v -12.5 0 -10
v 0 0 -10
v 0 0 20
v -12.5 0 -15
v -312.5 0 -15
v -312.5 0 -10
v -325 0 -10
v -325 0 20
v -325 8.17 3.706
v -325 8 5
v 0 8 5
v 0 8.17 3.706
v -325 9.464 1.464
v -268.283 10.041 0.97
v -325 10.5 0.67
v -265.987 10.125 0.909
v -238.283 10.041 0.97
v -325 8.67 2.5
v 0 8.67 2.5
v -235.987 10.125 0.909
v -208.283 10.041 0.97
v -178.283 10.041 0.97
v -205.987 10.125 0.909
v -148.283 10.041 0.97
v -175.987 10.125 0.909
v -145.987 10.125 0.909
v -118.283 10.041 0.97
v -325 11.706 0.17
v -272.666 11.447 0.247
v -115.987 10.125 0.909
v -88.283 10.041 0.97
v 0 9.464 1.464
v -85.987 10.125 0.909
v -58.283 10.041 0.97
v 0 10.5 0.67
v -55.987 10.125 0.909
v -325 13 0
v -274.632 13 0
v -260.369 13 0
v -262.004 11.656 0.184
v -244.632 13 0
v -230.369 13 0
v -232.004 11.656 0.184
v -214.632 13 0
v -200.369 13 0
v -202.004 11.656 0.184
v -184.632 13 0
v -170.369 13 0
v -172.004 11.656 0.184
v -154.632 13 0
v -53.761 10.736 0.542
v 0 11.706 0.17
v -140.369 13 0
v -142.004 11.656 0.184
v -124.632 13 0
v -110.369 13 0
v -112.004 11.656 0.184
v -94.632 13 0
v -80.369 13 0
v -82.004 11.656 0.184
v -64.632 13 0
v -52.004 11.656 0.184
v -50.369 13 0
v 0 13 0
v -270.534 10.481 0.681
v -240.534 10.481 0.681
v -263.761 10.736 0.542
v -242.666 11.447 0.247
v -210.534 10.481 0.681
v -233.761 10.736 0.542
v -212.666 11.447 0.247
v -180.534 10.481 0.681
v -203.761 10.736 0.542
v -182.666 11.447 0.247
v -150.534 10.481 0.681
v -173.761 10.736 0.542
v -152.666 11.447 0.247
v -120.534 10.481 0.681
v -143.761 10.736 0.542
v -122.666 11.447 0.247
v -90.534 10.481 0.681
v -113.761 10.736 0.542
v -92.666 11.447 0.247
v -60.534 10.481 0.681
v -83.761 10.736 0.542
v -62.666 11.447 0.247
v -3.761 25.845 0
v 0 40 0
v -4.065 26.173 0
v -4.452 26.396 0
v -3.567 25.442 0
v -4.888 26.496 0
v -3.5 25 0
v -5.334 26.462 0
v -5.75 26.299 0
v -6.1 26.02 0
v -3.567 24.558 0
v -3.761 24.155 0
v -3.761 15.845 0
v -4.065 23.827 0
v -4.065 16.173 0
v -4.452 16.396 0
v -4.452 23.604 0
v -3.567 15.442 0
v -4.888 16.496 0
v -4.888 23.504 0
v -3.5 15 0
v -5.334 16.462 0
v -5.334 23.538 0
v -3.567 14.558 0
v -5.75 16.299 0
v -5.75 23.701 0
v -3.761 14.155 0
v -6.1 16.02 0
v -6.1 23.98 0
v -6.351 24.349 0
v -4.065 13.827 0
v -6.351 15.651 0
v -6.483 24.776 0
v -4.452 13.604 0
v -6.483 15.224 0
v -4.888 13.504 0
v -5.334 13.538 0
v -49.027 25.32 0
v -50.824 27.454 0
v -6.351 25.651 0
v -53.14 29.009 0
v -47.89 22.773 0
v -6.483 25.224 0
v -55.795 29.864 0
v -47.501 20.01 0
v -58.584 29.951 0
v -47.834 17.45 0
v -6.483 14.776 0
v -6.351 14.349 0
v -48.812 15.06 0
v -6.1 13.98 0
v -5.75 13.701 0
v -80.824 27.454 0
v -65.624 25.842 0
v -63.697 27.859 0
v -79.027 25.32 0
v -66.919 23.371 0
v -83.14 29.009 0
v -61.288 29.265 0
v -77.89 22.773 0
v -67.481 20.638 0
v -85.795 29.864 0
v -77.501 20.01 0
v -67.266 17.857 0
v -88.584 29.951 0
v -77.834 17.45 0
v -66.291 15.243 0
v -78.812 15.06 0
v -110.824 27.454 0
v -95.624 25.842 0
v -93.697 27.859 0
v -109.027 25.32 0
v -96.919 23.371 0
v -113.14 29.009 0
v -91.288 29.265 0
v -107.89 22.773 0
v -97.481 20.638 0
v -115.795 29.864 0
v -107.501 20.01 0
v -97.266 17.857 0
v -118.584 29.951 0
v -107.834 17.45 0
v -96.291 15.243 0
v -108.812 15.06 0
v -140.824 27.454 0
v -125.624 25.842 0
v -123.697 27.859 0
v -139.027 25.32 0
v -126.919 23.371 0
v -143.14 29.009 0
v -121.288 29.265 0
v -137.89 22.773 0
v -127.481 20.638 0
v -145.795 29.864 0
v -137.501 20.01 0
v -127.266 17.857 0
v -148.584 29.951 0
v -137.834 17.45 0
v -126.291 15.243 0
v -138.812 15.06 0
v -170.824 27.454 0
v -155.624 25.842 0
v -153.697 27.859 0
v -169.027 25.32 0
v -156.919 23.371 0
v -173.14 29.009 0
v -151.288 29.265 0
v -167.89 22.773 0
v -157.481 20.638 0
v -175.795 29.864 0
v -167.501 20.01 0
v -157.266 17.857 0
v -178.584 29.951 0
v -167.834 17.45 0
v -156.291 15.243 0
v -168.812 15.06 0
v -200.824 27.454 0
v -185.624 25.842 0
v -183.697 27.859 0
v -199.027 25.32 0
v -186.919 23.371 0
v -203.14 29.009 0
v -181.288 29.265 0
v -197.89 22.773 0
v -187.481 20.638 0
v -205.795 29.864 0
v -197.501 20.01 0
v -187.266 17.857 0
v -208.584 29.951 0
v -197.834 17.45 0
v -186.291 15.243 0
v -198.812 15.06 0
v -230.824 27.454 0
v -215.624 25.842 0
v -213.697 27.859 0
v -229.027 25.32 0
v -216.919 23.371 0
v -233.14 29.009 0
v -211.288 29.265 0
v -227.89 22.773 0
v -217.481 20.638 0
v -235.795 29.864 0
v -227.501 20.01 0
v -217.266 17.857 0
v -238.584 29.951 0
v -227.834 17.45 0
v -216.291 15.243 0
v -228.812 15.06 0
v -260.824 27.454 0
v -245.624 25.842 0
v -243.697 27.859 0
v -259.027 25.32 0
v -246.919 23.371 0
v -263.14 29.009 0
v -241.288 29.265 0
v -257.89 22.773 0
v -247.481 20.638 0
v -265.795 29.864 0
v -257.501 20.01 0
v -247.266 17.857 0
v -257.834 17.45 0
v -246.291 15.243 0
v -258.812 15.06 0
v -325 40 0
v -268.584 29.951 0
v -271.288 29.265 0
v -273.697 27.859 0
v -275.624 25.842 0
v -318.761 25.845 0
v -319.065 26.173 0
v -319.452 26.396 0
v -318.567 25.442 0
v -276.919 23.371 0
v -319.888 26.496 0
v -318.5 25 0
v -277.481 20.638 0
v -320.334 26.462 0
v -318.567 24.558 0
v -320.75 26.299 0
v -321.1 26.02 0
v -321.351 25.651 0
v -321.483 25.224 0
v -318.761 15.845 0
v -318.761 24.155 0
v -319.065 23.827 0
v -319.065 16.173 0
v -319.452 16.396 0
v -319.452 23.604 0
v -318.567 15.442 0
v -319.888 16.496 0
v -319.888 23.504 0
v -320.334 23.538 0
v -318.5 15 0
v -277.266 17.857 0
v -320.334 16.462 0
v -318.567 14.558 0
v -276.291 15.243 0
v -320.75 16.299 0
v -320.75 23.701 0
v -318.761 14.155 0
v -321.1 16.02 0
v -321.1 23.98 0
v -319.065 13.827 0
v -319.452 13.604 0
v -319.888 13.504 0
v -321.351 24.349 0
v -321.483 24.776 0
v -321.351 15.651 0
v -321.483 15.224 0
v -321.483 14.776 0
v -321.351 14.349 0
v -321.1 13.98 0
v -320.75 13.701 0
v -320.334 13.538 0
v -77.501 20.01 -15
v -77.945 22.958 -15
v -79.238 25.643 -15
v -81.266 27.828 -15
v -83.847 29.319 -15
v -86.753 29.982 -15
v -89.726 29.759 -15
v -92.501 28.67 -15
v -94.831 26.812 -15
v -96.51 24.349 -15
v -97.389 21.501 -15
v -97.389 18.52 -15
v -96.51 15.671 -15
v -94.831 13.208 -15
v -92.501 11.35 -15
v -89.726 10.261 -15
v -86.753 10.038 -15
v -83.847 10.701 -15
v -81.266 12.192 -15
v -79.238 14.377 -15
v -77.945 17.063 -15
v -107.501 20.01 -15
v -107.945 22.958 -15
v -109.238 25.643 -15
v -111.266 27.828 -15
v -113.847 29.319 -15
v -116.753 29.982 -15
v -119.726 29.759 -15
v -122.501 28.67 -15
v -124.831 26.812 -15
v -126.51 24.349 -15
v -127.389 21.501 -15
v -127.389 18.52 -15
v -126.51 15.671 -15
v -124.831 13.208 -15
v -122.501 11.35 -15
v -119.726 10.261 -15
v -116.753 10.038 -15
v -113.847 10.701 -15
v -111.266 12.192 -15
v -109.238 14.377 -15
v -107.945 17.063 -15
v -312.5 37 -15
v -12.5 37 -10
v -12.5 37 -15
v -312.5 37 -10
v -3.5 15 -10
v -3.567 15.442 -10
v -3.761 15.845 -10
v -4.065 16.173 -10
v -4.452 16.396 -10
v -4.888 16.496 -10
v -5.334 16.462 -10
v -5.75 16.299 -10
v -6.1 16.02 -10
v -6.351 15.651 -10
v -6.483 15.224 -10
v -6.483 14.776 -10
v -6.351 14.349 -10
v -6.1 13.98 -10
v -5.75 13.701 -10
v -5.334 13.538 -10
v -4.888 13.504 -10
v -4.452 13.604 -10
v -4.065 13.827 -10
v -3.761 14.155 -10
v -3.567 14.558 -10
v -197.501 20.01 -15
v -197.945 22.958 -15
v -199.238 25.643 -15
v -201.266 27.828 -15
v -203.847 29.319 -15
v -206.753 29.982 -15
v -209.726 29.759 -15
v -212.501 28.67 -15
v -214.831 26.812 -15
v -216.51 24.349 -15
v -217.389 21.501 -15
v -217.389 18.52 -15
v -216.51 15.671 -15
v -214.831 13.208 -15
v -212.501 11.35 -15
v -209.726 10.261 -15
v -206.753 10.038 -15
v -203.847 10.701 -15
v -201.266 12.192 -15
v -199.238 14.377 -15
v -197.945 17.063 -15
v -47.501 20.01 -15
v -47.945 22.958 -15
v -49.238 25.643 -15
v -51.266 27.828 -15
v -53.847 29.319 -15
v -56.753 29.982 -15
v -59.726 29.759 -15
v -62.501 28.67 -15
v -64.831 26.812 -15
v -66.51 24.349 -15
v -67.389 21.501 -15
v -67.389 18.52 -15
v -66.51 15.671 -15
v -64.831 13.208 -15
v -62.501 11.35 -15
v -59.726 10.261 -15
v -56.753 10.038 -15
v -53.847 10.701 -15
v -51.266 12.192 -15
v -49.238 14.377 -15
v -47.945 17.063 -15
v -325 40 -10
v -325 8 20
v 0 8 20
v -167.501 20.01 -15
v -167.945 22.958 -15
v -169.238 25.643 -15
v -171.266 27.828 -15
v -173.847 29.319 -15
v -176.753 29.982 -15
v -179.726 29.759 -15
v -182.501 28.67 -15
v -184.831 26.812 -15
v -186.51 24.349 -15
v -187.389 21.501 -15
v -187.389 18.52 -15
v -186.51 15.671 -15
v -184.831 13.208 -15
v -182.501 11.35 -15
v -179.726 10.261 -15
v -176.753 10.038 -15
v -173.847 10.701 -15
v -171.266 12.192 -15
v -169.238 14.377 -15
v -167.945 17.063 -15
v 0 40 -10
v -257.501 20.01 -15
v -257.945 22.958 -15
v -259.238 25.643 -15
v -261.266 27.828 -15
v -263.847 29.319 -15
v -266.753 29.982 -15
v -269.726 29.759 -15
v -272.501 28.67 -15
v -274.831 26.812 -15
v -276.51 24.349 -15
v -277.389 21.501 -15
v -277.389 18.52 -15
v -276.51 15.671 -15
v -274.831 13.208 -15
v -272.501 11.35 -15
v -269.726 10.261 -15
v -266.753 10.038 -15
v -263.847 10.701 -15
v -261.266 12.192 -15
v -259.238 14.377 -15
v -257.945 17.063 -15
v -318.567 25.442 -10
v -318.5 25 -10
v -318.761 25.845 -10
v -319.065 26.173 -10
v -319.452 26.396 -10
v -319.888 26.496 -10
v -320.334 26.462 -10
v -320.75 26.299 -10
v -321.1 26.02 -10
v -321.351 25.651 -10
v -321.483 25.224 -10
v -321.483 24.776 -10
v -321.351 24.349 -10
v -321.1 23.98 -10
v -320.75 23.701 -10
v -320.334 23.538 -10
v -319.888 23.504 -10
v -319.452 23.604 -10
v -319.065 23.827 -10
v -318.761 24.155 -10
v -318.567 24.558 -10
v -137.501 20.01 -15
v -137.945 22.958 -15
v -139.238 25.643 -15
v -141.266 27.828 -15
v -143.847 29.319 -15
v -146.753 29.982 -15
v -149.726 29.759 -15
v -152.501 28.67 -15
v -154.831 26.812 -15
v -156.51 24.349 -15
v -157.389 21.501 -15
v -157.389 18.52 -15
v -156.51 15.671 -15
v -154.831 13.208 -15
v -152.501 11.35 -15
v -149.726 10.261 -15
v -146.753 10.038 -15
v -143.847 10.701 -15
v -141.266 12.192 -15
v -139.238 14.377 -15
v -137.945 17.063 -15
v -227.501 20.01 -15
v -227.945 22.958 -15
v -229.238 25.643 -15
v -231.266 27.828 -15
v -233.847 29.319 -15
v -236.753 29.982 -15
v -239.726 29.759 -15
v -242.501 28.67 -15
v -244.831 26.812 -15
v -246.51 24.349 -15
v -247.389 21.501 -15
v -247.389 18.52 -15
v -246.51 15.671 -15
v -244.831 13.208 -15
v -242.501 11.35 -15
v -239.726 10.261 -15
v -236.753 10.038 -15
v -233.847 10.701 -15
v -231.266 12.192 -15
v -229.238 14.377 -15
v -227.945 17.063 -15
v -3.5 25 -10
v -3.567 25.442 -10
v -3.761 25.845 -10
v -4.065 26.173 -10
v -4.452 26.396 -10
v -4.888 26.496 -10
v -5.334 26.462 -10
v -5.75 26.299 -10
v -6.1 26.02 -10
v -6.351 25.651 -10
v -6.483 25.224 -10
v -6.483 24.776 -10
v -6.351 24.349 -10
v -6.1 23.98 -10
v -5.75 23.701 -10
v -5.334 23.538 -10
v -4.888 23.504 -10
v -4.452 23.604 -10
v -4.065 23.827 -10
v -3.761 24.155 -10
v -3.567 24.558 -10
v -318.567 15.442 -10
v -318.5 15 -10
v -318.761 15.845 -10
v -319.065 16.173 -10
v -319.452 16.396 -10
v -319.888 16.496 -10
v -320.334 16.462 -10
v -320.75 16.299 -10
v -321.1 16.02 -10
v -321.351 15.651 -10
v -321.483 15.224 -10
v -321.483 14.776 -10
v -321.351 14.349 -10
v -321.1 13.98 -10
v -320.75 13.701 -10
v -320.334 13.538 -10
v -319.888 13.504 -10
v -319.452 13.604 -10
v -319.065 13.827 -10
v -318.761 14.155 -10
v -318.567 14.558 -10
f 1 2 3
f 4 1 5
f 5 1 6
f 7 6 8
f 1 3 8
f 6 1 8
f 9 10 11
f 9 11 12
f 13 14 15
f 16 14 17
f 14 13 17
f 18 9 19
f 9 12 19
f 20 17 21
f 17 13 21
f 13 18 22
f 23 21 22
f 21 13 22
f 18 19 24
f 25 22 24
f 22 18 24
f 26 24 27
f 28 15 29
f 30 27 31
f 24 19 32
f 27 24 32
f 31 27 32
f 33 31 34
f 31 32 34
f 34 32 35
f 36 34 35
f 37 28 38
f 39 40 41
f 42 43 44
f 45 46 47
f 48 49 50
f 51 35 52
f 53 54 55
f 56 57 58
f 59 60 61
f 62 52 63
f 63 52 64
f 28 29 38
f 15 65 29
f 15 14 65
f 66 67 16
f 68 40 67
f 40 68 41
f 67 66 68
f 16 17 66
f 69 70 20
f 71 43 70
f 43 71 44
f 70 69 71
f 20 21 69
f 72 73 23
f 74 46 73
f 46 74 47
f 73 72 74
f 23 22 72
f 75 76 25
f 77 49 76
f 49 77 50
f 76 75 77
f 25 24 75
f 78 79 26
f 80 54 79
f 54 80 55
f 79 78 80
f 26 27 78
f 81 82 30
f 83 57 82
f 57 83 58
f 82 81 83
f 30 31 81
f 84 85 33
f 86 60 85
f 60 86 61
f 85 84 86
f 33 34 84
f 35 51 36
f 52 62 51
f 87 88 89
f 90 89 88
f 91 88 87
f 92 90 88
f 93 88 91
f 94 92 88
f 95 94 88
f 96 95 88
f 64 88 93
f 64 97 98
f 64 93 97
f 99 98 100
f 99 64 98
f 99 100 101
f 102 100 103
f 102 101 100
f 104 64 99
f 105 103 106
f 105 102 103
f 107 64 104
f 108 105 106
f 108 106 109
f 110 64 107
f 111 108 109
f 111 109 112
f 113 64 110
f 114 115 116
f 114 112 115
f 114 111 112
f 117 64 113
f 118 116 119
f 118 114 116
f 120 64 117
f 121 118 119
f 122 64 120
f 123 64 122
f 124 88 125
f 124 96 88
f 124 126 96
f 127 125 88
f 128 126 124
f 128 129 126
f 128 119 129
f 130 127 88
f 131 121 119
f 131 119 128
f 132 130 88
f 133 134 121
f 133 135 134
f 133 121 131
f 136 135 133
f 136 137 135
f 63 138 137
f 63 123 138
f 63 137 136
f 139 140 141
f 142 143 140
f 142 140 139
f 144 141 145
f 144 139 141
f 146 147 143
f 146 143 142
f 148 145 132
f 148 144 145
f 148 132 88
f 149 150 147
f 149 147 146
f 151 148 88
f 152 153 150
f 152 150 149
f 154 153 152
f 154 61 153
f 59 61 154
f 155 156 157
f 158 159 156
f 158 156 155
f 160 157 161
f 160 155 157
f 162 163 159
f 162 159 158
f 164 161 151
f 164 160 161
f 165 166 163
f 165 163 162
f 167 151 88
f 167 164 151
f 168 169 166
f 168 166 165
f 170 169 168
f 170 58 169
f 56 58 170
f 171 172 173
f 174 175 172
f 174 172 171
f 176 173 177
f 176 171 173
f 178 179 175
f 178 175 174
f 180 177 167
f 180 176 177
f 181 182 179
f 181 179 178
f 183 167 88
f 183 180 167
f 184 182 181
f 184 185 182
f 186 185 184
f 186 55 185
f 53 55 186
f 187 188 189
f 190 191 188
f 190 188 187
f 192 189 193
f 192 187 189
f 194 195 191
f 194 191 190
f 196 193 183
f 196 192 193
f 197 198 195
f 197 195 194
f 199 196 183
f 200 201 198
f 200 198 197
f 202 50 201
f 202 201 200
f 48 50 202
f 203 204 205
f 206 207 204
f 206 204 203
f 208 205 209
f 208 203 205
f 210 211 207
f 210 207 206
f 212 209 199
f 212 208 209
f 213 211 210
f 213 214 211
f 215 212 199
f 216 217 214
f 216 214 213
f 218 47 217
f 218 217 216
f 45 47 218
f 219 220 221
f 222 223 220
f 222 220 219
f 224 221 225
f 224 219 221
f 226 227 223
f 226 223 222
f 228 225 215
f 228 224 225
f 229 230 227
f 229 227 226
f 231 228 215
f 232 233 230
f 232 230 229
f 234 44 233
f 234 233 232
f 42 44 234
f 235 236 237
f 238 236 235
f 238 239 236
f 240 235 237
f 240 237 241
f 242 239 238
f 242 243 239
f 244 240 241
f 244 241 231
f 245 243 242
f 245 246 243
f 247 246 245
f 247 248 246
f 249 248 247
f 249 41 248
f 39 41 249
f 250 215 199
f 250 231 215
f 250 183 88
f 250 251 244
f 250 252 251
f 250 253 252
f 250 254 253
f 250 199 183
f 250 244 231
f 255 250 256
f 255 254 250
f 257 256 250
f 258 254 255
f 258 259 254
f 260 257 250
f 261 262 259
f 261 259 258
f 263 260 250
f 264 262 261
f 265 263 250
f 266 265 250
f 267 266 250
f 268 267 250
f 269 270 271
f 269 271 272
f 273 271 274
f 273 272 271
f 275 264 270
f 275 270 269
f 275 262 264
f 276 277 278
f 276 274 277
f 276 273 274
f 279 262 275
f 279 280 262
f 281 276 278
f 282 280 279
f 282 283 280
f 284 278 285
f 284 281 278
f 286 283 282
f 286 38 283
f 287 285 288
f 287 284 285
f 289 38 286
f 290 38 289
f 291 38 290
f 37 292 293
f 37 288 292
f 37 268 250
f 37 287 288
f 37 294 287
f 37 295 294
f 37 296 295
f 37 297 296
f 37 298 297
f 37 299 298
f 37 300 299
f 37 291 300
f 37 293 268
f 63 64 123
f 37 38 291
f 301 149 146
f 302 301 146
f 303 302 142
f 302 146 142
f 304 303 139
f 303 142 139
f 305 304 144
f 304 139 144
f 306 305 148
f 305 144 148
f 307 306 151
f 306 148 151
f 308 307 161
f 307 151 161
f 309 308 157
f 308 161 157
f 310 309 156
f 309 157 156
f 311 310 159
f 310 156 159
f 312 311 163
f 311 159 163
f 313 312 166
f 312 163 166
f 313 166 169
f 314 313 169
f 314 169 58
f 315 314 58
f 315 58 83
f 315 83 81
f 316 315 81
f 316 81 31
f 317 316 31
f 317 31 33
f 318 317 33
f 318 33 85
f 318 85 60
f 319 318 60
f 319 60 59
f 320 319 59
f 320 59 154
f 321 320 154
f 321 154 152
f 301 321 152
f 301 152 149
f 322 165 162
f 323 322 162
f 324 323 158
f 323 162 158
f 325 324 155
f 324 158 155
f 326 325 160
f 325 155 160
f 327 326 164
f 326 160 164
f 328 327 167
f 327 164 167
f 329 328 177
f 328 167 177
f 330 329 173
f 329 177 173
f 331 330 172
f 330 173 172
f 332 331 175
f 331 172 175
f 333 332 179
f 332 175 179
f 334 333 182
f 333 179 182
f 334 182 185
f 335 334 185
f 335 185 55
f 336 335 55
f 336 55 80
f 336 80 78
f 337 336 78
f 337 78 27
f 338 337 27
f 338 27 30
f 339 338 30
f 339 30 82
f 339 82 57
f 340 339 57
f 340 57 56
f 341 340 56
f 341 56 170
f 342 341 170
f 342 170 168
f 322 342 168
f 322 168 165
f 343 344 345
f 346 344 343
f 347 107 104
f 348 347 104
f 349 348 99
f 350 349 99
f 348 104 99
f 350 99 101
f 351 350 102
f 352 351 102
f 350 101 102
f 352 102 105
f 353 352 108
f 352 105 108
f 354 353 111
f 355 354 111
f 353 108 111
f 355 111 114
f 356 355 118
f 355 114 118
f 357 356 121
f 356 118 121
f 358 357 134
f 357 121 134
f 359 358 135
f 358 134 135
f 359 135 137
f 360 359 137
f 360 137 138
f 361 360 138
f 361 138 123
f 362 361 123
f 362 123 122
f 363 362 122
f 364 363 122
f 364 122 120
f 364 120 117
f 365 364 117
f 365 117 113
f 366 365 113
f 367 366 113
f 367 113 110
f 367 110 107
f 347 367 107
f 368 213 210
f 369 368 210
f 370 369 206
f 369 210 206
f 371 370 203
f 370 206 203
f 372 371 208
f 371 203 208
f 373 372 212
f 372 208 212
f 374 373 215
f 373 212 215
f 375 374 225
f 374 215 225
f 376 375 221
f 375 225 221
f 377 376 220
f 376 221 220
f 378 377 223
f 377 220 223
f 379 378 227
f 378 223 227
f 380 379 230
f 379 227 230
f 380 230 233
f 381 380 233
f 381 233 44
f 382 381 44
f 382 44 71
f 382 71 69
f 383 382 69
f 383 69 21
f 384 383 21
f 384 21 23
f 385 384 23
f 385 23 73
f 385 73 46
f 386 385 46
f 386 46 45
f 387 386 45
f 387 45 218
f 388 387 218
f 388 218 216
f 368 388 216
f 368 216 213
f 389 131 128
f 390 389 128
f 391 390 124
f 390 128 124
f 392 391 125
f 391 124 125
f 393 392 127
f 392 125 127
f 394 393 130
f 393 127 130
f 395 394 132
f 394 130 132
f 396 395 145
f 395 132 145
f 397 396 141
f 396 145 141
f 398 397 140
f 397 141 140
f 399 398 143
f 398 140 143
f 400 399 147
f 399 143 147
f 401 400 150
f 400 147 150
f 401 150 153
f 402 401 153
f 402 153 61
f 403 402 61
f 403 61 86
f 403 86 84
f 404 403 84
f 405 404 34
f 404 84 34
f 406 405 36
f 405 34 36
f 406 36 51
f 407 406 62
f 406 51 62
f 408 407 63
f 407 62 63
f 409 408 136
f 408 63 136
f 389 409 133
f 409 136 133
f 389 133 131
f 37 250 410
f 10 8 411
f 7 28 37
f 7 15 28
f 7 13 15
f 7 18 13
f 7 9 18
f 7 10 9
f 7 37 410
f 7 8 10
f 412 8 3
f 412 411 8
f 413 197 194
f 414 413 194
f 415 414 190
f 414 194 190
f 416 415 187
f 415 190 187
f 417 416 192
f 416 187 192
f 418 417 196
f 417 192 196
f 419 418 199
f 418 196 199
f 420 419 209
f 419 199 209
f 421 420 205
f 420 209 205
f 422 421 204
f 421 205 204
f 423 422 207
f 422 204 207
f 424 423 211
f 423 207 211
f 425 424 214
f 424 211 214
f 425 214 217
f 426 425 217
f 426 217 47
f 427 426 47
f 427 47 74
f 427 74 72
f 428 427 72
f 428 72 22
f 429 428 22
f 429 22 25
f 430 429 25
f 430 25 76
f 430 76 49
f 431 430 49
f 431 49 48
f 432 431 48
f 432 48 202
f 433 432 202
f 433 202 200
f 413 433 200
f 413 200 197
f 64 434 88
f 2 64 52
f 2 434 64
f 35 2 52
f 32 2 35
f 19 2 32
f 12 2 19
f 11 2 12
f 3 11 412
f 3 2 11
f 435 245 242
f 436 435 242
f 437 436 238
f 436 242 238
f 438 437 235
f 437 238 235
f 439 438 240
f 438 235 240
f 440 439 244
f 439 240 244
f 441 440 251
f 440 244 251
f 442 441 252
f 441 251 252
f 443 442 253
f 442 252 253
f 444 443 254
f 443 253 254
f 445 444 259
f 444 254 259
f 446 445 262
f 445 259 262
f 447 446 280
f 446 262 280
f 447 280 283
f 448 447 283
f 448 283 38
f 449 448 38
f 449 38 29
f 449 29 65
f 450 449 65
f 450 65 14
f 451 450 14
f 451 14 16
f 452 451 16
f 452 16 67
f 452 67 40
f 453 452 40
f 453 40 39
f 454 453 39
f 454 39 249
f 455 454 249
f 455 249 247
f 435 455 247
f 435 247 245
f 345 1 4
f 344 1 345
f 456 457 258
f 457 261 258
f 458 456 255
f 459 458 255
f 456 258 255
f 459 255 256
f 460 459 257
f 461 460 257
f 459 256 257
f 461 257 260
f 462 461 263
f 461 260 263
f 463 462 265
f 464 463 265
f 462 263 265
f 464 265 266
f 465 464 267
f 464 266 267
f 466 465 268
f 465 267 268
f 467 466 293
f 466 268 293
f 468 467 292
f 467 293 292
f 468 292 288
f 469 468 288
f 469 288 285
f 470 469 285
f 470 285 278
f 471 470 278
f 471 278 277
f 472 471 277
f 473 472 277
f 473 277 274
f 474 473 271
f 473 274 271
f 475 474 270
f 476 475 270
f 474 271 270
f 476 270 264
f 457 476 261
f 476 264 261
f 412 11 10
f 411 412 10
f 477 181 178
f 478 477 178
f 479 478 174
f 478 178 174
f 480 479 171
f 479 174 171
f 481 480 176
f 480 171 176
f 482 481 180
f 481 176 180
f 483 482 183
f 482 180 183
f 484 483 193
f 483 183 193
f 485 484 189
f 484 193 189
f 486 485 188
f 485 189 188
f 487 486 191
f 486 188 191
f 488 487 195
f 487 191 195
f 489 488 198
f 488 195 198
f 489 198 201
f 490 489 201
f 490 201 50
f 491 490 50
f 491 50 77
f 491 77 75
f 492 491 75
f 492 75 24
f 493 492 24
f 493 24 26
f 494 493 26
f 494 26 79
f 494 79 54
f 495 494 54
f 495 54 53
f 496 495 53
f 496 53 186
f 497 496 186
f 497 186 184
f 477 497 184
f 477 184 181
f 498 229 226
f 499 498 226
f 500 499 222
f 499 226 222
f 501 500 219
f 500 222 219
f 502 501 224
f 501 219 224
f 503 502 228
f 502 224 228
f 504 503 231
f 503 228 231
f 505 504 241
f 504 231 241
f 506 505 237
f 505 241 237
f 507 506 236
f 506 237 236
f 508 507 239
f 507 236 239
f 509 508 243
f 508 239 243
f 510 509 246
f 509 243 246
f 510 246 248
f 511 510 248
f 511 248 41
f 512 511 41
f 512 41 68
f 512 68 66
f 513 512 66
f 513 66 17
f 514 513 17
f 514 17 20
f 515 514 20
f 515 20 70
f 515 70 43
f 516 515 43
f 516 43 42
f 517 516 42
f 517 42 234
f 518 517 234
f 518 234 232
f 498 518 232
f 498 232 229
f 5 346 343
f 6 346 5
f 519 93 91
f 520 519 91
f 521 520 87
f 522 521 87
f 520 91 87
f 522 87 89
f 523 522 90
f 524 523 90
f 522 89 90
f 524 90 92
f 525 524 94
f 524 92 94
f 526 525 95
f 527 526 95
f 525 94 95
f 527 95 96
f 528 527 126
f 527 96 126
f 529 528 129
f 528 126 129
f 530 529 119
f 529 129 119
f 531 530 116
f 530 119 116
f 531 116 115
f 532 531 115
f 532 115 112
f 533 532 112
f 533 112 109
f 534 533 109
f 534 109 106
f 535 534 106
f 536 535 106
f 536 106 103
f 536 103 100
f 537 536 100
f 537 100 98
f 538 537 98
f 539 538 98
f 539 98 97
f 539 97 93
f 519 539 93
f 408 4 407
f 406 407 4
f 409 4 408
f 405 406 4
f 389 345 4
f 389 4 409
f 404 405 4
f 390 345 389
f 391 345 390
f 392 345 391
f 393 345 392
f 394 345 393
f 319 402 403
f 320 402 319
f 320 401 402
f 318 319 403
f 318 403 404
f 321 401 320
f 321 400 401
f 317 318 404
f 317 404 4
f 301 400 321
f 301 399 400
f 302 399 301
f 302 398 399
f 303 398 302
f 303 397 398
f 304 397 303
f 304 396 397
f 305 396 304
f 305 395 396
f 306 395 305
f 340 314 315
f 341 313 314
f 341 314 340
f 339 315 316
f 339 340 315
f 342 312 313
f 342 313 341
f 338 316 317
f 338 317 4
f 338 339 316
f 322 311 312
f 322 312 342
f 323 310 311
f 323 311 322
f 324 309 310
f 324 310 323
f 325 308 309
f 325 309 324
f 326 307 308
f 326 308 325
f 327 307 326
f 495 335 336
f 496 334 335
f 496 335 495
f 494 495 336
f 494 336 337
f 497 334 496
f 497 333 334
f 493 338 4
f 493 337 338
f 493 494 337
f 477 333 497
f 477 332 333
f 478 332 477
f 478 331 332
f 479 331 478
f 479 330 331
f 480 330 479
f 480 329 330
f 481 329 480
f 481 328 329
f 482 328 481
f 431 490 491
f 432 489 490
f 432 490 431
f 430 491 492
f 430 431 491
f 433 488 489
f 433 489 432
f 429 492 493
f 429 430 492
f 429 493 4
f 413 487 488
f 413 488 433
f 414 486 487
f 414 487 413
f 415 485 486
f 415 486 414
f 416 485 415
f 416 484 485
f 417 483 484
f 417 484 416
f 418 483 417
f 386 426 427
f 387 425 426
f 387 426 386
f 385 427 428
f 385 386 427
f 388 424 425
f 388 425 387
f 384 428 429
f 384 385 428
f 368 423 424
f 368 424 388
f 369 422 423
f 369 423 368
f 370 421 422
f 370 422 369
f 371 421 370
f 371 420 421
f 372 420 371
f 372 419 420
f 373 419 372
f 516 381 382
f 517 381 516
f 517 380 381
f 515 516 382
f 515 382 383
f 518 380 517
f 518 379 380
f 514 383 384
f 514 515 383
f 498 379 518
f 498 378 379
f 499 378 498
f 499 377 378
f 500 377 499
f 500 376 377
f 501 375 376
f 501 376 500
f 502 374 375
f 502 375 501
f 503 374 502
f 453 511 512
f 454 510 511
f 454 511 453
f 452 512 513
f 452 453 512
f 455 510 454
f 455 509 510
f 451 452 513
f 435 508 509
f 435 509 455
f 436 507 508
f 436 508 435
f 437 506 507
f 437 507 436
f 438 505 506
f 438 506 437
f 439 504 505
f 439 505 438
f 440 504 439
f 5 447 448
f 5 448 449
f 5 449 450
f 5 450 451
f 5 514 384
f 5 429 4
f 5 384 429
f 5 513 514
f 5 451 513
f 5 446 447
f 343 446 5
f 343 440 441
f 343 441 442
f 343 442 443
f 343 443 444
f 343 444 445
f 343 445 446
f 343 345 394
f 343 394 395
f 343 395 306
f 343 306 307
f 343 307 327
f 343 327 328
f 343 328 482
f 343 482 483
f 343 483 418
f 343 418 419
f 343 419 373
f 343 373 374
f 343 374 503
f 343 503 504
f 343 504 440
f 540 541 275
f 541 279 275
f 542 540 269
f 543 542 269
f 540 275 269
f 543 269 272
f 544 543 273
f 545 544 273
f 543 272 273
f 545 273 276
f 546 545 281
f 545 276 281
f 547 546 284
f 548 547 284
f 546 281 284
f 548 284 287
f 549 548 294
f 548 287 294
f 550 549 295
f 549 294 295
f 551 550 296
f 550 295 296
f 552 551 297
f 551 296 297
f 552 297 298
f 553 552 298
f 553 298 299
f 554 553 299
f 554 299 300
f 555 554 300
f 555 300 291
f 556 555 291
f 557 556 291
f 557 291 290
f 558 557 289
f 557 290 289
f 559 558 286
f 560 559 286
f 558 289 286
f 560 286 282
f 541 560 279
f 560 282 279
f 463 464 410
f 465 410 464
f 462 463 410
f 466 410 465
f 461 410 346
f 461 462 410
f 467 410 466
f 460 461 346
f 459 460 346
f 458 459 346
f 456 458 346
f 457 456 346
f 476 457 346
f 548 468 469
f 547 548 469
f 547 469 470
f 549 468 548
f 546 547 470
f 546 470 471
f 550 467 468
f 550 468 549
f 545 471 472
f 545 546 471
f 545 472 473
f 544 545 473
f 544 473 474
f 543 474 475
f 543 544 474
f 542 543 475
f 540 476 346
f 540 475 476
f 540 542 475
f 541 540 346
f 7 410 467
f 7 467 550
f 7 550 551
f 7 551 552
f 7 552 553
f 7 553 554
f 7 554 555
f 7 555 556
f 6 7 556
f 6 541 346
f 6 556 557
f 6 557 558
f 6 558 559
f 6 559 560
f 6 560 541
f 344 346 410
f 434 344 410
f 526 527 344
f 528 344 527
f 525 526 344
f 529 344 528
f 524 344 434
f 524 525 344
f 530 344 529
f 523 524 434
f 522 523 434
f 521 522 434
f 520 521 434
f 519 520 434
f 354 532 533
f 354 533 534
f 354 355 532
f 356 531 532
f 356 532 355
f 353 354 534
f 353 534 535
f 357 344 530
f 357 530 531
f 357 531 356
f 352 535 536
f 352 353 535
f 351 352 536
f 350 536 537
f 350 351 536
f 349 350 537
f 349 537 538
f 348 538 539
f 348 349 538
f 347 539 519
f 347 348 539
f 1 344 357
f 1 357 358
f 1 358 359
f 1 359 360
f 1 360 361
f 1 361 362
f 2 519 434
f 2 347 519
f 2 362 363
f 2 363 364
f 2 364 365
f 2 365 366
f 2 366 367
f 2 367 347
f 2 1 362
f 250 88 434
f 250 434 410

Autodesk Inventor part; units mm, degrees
ref_plane "YZ Plane" through (0, 0, 0) normal (1, 0, 0) x (0, 1, 0)
ref_plane "XZ Plane" through (0, 0, 0) normal (0, 1, 0) x (-1, 0, 0)
ref_plane "XY Plane" through (0, 0, 0) normal (0, 0, 1) x (1, 0, 0)
sketch "Sketch1" plane through (0, 0, 0) normal (0, 1, 0) x (-1, 0, 0)
  line L0 (0, 0) -> (325, 0)
  line L1 (325, 0) -> (325, -10)
  line L2 (325, -10) -> (0, -10)
  line L3 (0, -10) -> (0, 0)
  dimension "d0" = 325
  dimension "d1" = 10
extrude "Extrusion1" add sketch "Sketch1" along normal blind 40
sketch "Sketch4" plane through (-325, 0, 0) normal (0, 0, 1) x (1, 0, 0)
  line L0 (325, 0) -> (0, 0) projected
  line L1 (325, 0) -> (325, 40) projected
  line L2 (0, 0) -> (325, 0)
  line L3 (325, 0) -> (325, 8)
  line L4 (325, 8) -> (0, 8)
  line L5 (0, 8) -> (0, 0)
  dimension "d34" = 8
extrude "Extrusion3" add sketch "Sketch4" along normal blind 20
sketch "Sketch5" plane through (-325, 40, 0) normal (0, 0, 1) x (1, 0, 0)
  circle A0 centre (320, -25) radius 1.5
  circle A1 centre (320, -15) radius 1.5
  line L0 (325, -32) -> (325, 0) projected
  line L1 (0, 0) -> (325, 0) projected
  circle A2 centre (5, -15) radius 1.5
  circle A3 centre (5, -25) radius 1.5
  line L2 (0, -32) -> (0, 0) projected
  point P0 (325, -40)
  point P1 (325, -27)
  point P2 (0, -27)
  dimension "d39" = 3
  dimension "d40" = 3
  dimension "d41" = 5
  dimension "d42" = 5
  dimension "d43" = 10
  dimension "d44" = 15
  dimension "d45" = 3
  dimension "d46" = 3
  dimension "d47" = 10
  dimension "d48" = 15
  dimension "d49" = 5
  dimension "d50" = 5
extrude "Extrusion4" cut sketch "Sketch5" against normal blind 20
thread "Thread1" size "M3x0.5" class "6H" standard "ANSI Metric M Profile" full length
thread "Thread2" size "M3x0.5" class "6H" standard "ANSI Metric M Profile" full length
thread "Thread3" size "M3x0.5" class "6H" standard "ANSI Metric M Profile" full length
thread "Thread4" size "M3x0.5" class "6H" standard "ANSI Metric M Profile" full length
sketch "Sketch8" plane through (0, 0, -10) normal (0, 0, -1) x (-1, 0, 0)
  line L0 (0, 40) -> (325, 40) projected
  line L1 (12.5, 37) -> (312.5, 37)
  line L2 (312.5, 37) -> (312.5, 0)
  line L3 (312.5, 0) -> (12.5, 0)
  line L4 (12.5, 0) -> (12.5, 37)
  line L5 (0, 0) -> (0, 40) projected
  line L6 (325, 0) -> (325, 40) projected
  point P0 (312.5, 18.5)
  dimension "d67" = 300
  dimension "d68" = 37
  dimension "d69" = 12.5
  dimension "d70" = 12.5
  dimension "d71" = 3
extrude "Extrusion5" add sketch "Sketch8" along normal blind 5
sketch "Sketch9" plane through (-325, 40, 0) normal (0, 0, 1) x (1, 0, 0)
  circle A0 centre (57.4993, -19.9899) radius 10
  circle A1 centre (87.4993, -19.9899) radius 10
  circle A2 centre (117.4993, -19.9899) radius 10
  circle A3 centre (147.4993, -19.9899) radius 10
  circle A4 centre (177.4993, -19.9899) radius 10
  circle A5 centre (207.4993, -19.9899) radius 10
  circle A6 centre (237.4993, -19.9899) radius 10
  circle A7 centre (267.4993, -19.9899) radius 10
  line L0 (-0.0007, -39.9899) -> (-0.0007, 0.0101)
  line L1 (324.9993, -39.9899) -> (324.9993, 0.0101)
  line L2 (-0.0007, 0.0101) -> (324.9993, 0.0101)
  point P0 (325, -40)
  dimension "d74" = 20
  dimension "d75" = 20
  dimension "d76" = 20
  dimension "d77" = 20
  dimension "d78" = 20
  dimension "d79" = 20
  dimension "d80" = 20
  dimension "d81" = 20
  dimension "d82" = 30
  dimension "d83" = 30
  dimension "d84" = 30
  dimension "d85" = 30
  dimension "d86" = 30
  dimension "d87" = 30
  dimension "d88" = 30
  dimension "d89" = 57.5
  dimension "d90" = 20
  dimension "d91" = 57.5
extrude "Extrusion6" cut sketch "Sketch9" against normal blind 40
fillet "Fillet2" radius 5 1 edges at (-162.5, 8, 0)
equation "\"d83\" = d82"
equation "\"d84\" = d83"
equation "\"d85\" = d84"
equation "\"d86\" = d85"
equation "\"d87\" = d86"
equation "\"d88\" = d87"
properties part number "chessboard-base-1"
